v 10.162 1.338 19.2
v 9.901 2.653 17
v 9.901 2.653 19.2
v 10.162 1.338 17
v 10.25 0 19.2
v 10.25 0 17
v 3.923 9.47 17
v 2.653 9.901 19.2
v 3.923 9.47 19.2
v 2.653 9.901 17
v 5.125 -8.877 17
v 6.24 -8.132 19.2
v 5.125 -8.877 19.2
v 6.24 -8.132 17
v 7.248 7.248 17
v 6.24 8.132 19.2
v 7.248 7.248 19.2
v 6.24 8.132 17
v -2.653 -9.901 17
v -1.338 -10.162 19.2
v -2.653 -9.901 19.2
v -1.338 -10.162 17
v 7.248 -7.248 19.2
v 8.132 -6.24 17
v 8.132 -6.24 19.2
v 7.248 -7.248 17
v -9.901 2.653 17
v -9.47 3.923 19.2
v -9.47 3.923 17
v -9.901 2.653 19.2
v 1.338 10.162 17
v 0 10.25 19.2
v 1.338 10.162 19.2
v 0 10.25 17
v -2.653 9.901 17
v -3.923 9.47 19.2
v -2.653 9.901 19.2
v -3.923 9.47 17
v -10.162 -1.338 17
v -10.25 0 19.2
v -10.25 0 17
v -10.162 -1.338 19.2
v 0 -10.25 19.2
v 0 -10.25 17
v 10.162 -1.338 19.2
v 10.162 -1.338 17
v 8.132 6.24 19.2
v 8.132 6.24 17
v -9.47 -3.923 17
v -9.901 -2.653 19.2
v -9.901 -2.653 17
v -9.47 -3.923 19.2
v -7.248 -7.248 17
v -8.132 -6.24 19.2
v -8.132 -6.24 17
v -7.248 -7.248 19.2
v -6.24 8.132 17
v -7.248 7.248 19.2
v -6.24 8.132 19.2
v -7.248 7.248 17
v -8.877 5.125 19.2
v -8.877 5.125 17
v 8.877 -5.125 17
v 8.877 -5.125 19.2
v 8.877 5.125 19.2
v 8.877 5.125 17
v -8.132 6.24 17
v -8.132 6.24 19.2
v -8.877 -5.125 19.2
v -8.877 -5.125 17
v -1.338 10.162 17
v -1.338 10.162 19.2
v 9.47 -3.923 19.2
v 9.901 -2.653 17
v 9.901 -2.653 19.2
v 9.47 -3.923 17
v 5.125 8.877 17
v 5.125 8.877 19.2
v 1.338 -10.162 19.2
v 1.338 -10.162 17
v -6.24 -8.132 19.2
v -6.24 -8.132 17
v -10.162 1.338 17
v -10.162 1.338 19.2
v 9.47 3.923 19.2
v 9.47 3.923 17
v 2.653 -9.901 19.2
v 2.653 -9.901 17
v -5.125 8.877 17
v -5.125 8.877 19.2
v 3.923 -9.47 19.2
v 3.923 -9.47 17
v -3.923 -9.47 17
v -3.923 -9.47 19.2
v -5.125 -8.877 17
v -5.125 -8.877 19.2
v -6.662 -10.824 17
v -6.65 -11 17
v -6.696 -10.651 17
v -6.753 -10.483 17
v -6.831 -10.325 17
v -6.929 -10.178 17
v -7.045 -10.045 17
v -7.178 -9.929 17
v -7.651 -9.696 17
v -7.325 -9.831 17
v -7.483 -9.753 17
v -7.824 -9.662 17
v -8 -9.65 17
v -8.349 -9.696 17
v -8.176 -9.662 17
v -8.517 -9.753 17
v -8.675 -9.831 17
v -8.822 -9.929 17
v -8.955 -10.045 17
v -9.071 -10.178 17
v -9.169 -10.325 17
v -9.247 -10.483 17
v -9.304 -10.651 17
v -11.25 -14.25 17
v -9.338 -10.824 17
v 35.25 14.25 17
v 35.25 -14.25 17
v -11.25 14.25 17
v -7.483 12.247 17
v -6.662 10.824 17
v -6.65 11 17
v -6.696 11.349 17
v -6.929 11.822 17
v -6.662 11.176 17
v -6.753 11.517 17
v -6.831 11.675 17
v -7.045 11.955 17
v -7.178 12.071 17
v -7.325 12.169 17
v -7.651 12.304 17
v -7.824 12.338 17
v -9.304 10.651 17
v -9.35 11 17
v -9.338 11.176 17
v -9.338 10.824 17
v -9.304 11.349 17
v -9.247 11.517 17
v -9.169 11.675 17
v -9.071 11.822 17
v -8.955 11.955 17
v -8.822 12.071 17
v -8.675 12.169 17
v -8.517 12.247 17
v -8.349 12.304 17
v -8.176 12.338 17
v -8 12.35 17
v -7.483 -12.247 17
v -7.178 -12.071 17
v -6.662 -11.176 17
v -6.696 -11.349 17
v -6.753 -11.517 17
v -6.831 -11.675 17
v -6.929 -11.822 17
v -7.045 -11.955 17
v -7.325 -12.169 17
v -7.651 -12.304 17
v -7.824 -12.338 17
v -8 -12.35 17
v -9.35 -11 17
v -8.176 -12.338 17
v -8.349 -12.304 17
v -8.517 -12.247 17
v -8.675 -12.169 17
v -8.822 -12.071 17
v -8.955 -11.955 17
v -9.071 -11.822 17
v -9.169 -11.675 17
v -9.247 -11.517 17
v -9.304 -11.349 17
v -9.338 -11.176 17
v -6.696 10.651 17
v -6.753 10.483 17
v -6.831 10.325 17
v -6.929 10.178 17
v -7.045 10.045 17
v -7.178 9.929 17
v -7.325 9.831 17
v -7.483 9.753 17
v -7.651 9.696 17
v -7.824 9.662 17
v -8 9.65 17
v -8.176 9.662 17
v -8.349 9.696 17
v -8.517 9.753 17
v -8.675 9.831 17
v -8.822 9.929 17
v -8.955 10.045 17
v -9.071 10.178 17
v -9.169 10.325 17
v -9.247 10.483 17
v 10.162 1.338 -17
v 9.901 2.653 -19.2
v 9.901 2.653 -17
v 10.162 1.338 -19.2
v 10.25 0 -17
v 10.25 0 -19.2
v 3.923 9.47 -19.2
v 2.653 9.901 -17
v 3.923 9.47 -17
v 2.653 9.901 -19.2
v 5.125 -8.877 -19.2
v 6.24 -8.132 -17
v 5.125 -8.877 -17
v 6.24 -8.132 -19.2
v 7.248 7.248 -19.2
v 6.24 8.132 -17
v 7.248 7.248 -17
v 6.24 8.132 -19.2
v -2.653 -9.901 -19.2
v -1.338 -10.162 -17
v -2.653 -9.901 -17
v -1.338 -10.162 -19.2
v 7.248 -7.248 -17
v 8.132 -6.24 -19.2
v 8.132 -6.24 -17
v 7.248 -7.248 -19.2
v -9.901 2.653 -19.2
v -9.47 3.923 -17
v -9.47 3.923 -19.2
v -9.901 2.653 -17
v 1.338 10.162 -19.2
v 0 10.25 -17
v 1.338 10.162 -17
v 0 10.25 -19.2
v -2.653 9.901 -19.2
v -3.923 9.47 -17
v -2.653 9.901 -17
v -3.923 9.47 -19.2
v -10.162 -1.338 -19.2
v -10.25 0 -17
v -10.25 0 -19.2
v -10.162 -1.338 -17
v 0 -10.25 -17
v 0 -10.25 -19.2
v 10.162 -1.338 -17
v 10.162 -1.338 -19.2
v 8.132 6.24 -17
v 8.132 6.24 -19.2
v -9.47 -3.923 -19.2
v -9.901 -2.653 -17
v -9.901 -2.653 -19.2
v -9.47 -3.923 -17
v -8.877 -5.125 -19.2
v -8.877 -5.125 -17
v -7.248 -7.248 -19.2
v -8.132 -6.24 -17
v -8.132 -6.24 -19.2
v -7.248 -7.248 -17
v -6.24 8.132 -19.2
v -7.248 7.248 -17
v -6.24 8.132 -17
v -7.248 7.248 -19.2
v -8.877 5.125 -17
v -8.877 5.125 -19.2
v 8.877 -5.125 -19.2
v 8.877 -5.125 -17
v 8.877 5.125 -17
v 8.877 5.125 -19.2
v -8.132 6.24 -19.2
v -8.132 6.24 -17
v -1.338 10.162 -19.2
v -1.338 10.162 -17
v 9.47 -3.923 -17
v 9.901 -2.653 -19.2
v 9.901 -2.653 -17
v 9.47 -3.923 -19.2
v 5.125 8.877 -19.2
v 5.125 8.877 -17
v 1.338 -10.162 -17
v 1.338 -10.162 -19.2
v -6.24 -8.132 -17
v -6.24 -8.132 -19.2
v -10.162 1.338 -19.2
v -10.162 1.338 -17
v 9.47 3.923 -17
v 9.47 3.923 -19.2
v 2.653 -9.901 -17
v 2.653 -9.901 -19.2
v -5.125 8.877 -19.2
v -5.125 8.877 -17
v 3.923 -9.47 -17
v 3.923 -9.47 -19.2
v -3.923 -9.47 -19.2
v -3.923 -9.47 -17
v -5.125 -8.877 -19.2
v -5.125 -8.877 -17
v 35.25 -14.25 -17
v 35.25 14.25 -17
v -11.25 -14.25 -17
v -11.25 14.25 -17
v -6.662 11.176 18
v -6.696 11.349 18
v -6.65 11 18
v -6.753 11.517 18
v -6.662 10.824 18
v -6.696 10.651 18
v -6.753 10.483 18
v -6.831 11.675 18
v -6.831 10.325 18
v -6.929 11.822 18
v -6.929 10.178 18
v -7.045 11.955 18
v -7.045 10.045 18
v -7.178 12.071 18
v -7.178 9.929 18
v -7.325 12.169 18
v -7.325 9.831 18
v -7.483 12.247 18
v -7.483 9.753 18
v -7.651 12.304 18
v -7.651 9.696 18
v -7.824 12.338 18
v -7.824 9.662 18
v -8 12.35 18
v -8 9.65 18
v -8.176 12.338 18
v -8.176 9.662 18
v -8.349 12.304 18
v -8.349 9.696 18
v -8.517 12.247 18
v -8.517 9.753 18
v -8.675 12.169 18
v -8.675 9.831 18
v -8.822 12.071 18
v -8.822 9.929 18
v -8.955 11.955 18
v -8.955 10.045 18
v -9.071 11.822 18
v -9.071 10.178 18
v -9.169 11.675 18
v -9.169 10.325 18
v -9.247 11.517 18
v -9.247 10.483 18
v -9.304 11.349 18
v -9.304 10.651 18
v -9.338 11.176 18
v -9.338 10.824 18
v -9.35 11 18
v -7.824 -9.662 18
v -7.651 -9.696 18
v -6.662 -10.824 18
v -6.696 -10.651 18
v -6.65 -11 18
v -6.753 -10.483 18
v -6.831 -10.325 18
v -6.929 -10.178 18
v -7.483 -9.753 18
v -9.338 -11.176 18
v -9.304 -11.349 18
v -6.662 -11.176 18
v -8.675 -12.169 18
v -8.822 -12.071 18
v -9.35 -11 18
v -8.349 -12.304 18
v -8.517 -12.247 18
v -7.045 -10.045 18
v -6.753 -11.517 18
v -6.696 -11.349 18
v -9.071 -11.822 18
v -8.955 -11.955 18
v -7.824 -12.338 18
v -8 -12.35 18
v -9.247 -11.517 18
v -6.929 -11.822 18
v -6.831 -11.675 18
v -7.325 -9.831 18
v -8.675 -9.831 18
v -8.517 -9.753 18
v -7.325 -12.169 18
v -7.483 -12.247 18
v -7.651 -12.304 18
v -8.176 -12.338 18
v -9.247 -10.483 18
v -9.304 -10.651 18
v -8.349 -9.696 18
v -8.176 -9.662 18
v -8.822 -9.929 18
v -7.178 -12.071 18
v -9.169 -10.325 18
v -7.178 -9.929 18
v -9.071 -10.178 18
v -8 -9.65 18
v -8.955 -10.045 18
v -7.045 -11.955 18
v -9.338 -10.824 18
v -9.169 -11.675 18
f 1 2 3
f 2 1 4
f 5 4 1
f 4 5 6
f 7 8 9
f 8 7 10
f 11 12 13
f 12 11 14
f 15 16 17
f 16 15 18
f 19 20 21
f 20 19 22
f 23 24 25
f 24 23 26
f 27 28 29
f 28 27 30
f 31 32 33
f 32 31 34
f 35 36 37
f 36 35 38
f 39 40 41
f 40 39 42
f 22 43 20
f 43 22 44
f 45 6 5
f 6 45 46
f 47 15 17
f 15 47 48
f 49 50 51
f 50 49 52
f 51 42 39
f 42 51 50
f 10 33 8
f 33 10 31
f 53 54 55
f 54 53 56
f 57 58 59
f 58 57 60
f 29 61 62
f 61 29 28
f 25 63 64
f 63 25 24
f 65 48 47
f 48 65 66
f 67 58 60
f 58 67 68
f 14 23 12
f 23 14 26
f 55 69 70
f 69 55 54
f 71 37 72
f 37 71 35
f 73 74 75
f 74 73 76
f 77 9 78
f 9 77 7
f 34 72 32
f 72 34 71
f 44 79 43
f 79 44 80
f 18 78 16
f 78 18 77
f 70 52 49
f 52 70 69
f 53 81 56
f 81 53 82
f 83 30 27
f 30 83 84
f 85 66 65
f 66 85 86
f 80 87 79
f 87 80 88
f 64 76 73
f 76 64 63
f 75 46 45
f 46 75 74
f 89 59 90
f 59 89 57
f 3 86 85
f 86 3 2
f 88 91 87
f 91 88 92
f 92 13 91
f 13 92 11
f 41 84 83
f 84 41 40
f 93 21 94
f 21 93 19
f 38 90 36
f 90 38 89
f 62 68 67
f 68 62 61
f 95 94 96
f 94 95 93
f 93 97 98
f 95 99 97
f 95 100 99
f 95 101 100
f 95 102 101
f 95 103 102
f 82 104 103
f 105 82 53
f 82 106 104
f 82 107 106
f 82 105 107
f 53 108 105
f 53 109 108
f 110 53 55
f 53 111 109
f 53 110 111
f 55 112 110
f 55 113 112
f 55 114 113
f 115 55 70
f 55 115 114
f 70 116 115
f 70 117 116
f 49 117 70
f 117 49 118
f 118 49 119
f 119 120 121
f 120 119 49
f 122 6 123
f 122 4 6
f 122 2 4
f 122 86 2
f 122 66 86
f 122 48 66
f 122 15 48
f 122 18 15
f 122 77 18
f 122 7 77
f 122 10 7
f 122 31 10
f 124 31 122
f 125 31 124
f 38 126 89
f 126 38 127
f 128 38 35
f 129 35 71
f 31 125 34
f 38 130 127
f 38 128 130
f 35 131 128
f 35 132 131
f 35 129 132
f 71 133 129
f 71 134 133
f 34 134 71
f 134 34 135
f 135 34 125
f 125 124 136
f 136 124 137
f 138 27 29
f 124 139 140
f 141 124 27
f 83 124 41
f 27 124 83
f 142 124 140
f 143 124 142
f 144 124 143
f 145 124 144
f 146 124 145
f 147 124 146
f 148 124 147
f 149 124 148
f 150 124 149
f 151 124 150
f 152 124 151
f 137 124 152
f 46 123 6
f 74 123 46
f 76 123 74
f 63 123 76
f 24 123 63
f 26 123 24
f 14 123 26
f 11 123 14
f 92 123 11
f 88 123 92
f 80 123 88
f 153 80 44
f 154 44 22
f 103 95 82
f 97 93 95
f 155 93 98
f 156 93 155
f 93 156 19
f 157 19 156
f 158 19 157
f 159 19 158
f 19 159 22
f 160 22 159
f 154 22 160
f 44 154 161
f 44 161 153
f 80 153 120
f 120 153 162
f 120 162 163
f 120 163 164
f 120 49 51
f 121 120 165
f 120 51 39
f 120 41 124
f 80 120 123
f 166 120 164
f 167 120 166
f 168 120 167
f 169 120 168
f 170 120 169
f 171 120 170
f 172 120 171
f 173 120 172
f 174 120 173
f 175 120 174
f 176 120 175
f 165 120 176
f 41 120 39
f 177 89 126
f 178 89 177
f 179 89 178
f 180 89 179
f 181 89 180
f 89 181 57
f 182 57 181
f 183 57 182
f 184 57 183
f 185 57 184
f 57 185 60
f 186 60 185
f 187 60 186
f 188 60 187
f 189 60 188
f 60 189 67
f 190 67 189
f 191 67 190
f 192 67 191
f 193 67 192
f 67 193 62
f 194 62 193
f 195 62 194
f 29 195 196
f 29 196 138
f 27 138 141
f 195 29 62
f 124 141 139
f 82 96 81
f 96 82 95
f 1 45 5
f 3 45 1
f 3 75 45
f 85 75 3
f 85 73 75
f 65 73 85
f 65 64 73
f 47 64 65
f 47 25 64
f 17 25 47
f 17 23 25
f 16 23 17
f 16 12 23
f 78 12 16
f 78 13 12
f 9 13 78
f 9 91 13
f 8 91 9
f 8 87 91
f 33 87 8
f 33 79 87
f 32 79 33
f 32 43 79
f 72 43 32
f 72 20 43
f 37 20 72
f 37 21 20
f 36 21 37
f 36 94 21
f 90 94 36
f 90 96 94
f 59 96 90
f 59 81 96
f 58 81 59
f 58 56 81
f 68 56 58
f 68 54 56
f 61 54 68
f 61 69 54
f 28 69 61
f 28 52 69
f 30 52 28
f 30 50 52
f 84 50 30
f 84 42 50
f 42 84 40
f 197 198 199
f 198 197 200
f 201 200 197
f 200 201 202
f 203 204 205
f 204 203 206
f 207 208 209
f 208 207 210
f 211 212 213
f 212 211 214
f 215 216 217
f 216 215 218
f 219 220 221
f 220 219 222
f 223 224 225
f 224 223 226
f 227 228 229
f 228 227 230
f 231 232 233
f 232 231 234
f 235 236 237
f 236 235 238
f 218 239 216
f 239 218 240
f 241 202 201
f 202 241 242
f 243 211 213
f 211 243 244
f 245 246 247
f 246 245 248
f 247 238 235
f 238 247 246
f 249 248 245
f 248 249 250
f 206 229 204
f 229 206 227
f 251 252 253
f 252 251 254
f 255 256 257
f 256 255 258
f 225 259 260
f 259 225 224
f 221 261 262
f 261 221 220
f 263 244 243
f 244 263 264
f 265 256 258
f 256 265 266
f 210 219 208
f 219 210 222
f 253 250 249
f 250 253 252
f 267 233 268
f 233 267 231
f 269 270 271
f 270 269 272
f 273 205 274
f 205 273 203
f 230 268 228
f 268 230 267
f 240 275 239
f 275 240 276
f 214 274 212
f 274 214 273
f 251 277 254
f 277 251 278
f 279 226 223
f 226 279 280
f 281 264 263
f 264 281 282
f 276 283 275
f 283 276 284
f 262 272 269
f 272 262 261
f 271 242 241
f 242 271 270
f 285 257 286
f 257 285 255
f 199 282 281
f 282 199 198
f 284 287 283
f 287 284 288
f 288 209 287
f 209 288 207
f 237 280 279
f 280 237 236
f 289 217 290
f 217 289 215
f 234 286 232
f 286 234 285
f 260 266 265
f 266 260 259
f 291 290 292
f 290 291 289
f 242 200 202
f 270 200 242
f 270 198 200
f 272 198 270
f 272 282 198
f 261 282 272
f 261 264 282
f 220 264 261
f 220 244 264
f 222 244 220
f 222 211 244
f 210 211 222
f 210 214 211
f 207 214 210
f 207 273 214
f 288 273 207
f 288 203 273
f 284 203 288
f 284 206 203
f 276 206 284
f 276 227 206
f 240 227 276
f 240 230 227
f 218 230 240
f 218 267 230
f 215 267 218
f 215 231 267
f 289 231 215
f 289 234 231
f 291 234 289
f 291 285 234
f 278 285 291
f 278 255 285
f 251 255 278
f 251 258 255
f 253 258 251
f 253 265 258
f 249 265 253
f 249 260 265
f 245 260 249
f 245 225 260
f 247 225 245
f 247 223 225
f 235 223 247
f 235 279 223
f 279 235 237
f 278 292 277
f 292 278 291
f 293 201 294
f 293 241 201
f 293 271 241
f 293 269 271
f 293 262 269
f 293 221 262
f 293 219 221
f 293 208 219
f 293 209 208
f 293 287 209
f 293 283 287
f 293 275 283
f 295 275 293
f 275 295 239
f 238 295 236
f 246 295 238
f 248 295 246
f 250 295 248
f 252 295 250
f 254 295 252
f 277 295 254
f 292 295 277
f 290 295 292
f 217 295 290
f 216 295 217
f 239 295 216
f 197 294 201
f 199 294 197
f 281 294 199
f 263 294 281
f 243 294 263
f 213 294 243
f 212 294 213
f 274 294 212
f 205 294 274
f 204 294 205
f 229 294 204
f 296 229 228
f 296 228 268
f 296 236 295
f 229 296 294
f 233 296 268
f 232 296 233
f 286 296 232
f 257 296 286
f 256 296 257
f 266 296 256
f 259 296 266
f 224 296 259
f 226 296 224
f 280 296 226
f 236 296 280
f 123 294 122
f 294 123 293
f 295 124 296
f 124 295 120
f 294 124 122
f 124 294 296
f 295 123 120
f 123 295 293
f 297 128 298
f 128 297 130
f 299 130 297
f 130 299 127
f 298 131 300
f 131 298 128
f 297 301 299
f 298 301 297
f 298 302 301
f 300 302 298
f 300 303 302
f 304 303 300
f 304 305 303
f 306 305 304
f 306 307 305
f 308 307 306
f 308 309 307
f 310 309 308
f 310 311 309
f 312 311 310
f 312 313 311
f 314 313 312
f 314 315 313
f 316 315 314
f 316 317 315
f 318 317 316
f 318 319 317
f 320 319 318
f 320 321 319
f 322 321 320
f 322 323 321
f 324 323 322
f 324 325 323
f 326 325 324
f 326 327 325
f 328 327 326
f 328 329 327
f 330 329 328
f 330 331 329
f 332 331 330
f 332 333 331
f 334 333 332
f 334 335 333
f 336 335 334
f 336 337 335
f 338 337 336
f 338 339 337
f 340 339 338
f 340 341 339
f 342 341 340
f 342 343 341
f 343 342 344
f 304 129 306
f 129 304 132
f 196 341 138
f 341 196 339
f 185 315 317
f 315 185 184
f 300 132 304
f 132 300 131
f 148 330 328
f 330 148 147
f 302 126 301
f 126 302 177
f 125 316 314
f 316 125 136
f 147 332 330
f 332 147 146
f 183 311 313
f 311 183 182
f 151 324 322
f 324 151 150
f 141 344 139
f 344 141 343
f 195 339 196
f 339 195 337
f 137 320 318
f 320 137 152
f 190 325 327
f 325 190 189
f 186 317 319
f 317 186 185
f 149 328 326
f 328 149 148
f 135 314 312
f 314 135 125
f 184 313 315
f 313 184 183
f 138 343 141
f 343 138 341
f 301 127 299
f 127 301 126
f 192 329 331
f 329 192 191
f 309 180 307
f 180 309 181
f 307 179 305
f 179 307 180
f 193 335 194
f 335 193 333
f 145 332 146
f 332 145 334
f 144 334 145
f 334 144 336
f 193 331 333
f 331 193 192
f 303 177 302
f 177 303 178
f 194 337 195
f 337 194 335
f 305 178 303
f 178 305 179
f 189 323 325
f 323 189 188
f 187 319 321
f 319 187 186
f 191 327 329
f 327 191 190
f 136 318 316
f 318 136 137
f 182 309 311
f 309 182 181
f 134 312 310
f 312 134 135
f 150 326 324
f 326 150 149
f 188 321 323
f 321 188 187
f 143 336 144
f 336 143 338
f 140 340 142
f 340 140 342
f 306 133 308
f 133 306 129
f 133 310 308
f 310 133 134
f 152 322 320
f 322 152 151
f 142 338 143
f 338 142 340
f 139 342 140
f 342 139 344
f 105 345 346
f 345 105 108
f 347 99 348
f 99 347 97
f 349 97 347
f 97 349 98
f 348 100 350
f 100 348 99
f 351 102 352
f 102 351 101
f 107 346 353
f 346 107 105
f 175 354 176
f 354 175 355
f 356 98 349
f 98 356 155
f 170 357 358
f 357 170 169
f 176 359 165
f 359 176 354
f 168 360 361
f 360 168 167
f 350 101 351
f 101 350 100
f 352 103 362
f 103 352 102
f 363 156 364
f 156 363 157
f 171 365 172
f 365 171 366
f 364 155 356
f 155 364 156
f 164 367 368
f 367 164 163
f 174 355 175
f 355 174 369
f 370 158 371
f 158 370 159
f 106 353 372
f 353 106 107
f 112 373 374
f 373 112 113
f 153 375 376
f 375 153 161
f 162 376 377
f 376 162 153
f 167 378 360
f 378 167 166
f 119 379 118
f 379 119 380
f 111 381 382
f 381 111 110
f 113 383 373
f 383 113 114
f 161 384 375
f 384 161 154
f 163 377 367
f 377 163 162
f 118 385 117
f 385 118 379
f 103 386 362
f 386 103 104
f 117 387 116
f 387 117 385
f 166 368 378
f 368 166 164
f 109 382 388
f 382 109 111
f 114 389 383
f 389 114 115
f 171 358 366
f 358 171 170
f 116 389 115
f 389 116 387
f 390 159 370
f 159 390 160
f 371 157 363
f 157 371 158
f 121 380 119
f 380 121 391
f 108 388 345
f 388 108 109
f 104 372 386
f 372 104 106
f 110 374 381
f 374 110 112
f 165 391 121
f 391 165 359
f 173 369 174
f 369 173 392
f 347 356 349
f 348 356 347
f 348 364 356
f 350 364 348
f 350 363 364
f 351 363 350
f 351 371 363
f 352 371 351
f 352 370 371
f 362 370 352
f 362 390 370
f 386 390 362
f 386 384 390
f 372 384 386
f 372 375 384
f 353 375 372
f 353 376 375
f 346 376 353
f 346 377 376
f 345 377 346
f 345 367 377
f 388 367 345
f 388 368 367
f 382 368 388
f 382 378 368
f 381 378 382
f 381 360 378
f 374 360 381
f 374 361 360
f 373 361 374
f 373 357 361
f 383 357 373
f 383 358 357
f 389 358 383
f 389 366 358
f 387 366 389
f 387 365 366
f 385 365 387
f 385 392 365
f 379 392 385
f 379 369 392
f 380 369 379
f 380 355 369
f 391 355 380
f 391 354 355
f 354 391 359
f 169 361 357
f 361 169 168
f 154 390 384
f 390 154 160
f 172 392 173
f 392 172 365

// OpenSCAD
// file: xl430.scad
// =====================================================================
//  xl430.scad  -  Dynamixel XL430-W250 dimensions + a simple dummy model
// =====================================================================
//  This file draws nothing by itself. Other files load it with:
//      include <xl430.scad>
//  Every number comes from the ROBOTIS XL-430 drawing (24-Mar-18).
//  All units are millimetres.
//
//  SERVO COORDINATES used by every file in this folder:
//      Z axis = the output shaft. The horn is on the +Z face (the "front"),
//               the back idler is on the -Z face (the "back").
//      X axis = the long direction of the case. The shaft is near the
//               -X end (the "top" of the servo); the long part of the
//               case (and the cable connectors) is toward +X.
//      Y axis = across the case (the 28.5 mm direction).
//      The origin (0,0,0) is ON the shaft, halfway between front and back.
//
//   front face, looking at the horn:
//
//        o-----------o      o = case screws in the 4 corners.
//        |   (horn)  |          Only the TOP two (next to the horn) are
//        |     +     |          used to hold parts, on the front AND back.
//        |           |          The side faces have no safe screw holes.
//        |           |
//        o-----------o
// =====================================================================

// ---------- case size ----------
servo_width  = 28.5;    // Y: across the front face
servo_length = 46.5;    // X: the long direction
servo_depth  = 34;      // Z: front face of the case to back face of the case
axis_from_top    = 11.25;                          // shaft to the short (-X) end
axis_from_bottom = servo_length - axis_from_top;   // shaft to the long (+X) end = 35.25

// How far the horn (front) and the idler (back) stand out from the case.
// A part that sits between the case and a bracket ear must be thinner than this.
// !! MEASURE THIS WITH CALIPERS on your own servo. Both sides should match.
horn_proud = 2.2;

// Horn face to back-idler face. Bracket ears clamp these two faces.
wheel_to_wheel = servo_depth + 2 * horn_proud;

// ---------- horn and idler ----------
horn_d   = 20.5;    // outer diameter of the horn and of the back idler
horn_pcd = 16;      // the 4 horn screws sit on a circle this big
horn_screw_angle = 0;   // angle of the first of the 4 screws (they are 90 deg apart)
hub_d    = 8;       // the centre boss (with its screw) that sticks out of the horn

// ---------- case screws in the corners of the front and back faces ----------
corner_inset = 3.25;    // each screw is this far in from both edges (22 x 40 mm pattern)
// the two TOP corner screws (next to the horn), as [x, y], in servo coordinates:
top_corner_screws = [
    [-axis_from_top + corner_inset,  servo_width / 2 - corner_inset],    // [-8,  11]
    [-axis_from_top + corner_inset, -servo_width / 2 + corner_inset]     // [-8, -11]
];
// the two BOTTOM corner screws (far end of the case):
bottom_corner_screws = [
    [axis_from_bottom - corner_inset,  servo_width / 2 - corner_inset],  // [32,  11]
    [axis_from_bottom - corner_inset, -servo_width / 2 + corner_inset]   // [32, -11]
];

// ---------- screws you will use ----------
m2_hole       = 2.2;   // M2 clearance hole  (horn and idler screws, M2 x 6)
m2_head_d     = 4.4;   // M2 screw head pocket
head_pocket_h = 1.5;   // depth of the M2 head pockets
m25_hole      = 2.7;   // M2.5 clearance hole (case corner screws)
m25_csk_d     = 5.0;   // M2.5 flat-head countersink, diameter at the surface

// ---------- printing ----------
fit = 0.25;    // gap per side around the servo case. Use 0.3 if parts come out tight.
$fn = 48;      // circle smoothness (bigger = smoother, slower)


// Grey stand-in for the servo. Only used for previews, never printed.
module xl430_dummy() {
    color("DimGray")
        translate([-axis_from_top, -servo_width / 2, -servo_depth / 2])
            cube([servo_length, servo_width, servo_depth]);
    // horn (+Z) and idler (-Z)
    color("Silver") {
        translate([0, 0, servo_depth / 2])               cylinder(d = horn_d, h = horn_proud);
        translate([0, 0, -servo_depth / 2 - horn_proud]) cylinder(d = horn_d, h = horn_proud);
    }
}

// The 4 horn screws + the centre clearance hole, as solid cylinders standing on
// the XY plane. Subtract them from a plate that has the shaft on its Z axis.
//   plate_t = thickness of that plate
//   pocket  = "top" or "bottom": which face gets the screw-head pockets
module horn_holes(plate_t, pocket = "top") {
    // centre: clears the hub and lets a screwdriver reach the centre screw
    translate([0, 0, -1]) cylinder(d = hub_d + 2, h = plate_t + 2);
    for (a = [0 : 90 : 270]) {
        rotate([0, 0, horn_screw_angle + a]) translate([horn_pcd / 2, 0, 0]) {
            translate([0, 0, -1]) cylinder(d = m2_hole, h = plate_t + 2);
            if (pocket == "top")
                translate([0, 0, plate_t - head_pocket_h]) cylinder(d = m2_head_d, h = head_pocket_h + 1);
            else
                translate([0, 0, -1]) cylinder(d = m2_head_d, h = head_pocket_h + 1);
        }
    }
}

// One M2.5 flat-head screw hole for a plate of thickness plate_t lying on z = 0.
// The countersink (cone) opens on the top face, so the screw head sits flush.
module countersunk_hole(plate_t) {
    csk_depth = (m25_csk_d - m25_hole) / 2;      // 90 degree cone
    translate([0, 0, -1]) cylinder(d = m25_hole, h = plate_t + 2);
    translate([0, 0, plate_t - csk_depth]) cylinder(d1 = m25_hole, d2 = m25_csk_d, h = csk_depth + 0.01);
    translate([0, 0, plate_t]) cylinder(d = m25_csk_d, h = 1);
}
// main file
// =====================================================================
//  xl430_preview.scad  -  shows the stand-in servo from xl430.scad.
//  xl430.scad only holds numbers and modules, so it draws nothing when
//  opened on its own. Open THIS file and press F5 to see the servo.
//  Red dots = the two top-corner case screws on the front face.
// =====================================================================

include <xl430.scad>

xl430_dummy();

color("Red")
    for (screw = top_corner_screws)
        translate([screw[0], screw[1], servo_depth / 2]) cylinder(d = m25_hole, h = 1);
